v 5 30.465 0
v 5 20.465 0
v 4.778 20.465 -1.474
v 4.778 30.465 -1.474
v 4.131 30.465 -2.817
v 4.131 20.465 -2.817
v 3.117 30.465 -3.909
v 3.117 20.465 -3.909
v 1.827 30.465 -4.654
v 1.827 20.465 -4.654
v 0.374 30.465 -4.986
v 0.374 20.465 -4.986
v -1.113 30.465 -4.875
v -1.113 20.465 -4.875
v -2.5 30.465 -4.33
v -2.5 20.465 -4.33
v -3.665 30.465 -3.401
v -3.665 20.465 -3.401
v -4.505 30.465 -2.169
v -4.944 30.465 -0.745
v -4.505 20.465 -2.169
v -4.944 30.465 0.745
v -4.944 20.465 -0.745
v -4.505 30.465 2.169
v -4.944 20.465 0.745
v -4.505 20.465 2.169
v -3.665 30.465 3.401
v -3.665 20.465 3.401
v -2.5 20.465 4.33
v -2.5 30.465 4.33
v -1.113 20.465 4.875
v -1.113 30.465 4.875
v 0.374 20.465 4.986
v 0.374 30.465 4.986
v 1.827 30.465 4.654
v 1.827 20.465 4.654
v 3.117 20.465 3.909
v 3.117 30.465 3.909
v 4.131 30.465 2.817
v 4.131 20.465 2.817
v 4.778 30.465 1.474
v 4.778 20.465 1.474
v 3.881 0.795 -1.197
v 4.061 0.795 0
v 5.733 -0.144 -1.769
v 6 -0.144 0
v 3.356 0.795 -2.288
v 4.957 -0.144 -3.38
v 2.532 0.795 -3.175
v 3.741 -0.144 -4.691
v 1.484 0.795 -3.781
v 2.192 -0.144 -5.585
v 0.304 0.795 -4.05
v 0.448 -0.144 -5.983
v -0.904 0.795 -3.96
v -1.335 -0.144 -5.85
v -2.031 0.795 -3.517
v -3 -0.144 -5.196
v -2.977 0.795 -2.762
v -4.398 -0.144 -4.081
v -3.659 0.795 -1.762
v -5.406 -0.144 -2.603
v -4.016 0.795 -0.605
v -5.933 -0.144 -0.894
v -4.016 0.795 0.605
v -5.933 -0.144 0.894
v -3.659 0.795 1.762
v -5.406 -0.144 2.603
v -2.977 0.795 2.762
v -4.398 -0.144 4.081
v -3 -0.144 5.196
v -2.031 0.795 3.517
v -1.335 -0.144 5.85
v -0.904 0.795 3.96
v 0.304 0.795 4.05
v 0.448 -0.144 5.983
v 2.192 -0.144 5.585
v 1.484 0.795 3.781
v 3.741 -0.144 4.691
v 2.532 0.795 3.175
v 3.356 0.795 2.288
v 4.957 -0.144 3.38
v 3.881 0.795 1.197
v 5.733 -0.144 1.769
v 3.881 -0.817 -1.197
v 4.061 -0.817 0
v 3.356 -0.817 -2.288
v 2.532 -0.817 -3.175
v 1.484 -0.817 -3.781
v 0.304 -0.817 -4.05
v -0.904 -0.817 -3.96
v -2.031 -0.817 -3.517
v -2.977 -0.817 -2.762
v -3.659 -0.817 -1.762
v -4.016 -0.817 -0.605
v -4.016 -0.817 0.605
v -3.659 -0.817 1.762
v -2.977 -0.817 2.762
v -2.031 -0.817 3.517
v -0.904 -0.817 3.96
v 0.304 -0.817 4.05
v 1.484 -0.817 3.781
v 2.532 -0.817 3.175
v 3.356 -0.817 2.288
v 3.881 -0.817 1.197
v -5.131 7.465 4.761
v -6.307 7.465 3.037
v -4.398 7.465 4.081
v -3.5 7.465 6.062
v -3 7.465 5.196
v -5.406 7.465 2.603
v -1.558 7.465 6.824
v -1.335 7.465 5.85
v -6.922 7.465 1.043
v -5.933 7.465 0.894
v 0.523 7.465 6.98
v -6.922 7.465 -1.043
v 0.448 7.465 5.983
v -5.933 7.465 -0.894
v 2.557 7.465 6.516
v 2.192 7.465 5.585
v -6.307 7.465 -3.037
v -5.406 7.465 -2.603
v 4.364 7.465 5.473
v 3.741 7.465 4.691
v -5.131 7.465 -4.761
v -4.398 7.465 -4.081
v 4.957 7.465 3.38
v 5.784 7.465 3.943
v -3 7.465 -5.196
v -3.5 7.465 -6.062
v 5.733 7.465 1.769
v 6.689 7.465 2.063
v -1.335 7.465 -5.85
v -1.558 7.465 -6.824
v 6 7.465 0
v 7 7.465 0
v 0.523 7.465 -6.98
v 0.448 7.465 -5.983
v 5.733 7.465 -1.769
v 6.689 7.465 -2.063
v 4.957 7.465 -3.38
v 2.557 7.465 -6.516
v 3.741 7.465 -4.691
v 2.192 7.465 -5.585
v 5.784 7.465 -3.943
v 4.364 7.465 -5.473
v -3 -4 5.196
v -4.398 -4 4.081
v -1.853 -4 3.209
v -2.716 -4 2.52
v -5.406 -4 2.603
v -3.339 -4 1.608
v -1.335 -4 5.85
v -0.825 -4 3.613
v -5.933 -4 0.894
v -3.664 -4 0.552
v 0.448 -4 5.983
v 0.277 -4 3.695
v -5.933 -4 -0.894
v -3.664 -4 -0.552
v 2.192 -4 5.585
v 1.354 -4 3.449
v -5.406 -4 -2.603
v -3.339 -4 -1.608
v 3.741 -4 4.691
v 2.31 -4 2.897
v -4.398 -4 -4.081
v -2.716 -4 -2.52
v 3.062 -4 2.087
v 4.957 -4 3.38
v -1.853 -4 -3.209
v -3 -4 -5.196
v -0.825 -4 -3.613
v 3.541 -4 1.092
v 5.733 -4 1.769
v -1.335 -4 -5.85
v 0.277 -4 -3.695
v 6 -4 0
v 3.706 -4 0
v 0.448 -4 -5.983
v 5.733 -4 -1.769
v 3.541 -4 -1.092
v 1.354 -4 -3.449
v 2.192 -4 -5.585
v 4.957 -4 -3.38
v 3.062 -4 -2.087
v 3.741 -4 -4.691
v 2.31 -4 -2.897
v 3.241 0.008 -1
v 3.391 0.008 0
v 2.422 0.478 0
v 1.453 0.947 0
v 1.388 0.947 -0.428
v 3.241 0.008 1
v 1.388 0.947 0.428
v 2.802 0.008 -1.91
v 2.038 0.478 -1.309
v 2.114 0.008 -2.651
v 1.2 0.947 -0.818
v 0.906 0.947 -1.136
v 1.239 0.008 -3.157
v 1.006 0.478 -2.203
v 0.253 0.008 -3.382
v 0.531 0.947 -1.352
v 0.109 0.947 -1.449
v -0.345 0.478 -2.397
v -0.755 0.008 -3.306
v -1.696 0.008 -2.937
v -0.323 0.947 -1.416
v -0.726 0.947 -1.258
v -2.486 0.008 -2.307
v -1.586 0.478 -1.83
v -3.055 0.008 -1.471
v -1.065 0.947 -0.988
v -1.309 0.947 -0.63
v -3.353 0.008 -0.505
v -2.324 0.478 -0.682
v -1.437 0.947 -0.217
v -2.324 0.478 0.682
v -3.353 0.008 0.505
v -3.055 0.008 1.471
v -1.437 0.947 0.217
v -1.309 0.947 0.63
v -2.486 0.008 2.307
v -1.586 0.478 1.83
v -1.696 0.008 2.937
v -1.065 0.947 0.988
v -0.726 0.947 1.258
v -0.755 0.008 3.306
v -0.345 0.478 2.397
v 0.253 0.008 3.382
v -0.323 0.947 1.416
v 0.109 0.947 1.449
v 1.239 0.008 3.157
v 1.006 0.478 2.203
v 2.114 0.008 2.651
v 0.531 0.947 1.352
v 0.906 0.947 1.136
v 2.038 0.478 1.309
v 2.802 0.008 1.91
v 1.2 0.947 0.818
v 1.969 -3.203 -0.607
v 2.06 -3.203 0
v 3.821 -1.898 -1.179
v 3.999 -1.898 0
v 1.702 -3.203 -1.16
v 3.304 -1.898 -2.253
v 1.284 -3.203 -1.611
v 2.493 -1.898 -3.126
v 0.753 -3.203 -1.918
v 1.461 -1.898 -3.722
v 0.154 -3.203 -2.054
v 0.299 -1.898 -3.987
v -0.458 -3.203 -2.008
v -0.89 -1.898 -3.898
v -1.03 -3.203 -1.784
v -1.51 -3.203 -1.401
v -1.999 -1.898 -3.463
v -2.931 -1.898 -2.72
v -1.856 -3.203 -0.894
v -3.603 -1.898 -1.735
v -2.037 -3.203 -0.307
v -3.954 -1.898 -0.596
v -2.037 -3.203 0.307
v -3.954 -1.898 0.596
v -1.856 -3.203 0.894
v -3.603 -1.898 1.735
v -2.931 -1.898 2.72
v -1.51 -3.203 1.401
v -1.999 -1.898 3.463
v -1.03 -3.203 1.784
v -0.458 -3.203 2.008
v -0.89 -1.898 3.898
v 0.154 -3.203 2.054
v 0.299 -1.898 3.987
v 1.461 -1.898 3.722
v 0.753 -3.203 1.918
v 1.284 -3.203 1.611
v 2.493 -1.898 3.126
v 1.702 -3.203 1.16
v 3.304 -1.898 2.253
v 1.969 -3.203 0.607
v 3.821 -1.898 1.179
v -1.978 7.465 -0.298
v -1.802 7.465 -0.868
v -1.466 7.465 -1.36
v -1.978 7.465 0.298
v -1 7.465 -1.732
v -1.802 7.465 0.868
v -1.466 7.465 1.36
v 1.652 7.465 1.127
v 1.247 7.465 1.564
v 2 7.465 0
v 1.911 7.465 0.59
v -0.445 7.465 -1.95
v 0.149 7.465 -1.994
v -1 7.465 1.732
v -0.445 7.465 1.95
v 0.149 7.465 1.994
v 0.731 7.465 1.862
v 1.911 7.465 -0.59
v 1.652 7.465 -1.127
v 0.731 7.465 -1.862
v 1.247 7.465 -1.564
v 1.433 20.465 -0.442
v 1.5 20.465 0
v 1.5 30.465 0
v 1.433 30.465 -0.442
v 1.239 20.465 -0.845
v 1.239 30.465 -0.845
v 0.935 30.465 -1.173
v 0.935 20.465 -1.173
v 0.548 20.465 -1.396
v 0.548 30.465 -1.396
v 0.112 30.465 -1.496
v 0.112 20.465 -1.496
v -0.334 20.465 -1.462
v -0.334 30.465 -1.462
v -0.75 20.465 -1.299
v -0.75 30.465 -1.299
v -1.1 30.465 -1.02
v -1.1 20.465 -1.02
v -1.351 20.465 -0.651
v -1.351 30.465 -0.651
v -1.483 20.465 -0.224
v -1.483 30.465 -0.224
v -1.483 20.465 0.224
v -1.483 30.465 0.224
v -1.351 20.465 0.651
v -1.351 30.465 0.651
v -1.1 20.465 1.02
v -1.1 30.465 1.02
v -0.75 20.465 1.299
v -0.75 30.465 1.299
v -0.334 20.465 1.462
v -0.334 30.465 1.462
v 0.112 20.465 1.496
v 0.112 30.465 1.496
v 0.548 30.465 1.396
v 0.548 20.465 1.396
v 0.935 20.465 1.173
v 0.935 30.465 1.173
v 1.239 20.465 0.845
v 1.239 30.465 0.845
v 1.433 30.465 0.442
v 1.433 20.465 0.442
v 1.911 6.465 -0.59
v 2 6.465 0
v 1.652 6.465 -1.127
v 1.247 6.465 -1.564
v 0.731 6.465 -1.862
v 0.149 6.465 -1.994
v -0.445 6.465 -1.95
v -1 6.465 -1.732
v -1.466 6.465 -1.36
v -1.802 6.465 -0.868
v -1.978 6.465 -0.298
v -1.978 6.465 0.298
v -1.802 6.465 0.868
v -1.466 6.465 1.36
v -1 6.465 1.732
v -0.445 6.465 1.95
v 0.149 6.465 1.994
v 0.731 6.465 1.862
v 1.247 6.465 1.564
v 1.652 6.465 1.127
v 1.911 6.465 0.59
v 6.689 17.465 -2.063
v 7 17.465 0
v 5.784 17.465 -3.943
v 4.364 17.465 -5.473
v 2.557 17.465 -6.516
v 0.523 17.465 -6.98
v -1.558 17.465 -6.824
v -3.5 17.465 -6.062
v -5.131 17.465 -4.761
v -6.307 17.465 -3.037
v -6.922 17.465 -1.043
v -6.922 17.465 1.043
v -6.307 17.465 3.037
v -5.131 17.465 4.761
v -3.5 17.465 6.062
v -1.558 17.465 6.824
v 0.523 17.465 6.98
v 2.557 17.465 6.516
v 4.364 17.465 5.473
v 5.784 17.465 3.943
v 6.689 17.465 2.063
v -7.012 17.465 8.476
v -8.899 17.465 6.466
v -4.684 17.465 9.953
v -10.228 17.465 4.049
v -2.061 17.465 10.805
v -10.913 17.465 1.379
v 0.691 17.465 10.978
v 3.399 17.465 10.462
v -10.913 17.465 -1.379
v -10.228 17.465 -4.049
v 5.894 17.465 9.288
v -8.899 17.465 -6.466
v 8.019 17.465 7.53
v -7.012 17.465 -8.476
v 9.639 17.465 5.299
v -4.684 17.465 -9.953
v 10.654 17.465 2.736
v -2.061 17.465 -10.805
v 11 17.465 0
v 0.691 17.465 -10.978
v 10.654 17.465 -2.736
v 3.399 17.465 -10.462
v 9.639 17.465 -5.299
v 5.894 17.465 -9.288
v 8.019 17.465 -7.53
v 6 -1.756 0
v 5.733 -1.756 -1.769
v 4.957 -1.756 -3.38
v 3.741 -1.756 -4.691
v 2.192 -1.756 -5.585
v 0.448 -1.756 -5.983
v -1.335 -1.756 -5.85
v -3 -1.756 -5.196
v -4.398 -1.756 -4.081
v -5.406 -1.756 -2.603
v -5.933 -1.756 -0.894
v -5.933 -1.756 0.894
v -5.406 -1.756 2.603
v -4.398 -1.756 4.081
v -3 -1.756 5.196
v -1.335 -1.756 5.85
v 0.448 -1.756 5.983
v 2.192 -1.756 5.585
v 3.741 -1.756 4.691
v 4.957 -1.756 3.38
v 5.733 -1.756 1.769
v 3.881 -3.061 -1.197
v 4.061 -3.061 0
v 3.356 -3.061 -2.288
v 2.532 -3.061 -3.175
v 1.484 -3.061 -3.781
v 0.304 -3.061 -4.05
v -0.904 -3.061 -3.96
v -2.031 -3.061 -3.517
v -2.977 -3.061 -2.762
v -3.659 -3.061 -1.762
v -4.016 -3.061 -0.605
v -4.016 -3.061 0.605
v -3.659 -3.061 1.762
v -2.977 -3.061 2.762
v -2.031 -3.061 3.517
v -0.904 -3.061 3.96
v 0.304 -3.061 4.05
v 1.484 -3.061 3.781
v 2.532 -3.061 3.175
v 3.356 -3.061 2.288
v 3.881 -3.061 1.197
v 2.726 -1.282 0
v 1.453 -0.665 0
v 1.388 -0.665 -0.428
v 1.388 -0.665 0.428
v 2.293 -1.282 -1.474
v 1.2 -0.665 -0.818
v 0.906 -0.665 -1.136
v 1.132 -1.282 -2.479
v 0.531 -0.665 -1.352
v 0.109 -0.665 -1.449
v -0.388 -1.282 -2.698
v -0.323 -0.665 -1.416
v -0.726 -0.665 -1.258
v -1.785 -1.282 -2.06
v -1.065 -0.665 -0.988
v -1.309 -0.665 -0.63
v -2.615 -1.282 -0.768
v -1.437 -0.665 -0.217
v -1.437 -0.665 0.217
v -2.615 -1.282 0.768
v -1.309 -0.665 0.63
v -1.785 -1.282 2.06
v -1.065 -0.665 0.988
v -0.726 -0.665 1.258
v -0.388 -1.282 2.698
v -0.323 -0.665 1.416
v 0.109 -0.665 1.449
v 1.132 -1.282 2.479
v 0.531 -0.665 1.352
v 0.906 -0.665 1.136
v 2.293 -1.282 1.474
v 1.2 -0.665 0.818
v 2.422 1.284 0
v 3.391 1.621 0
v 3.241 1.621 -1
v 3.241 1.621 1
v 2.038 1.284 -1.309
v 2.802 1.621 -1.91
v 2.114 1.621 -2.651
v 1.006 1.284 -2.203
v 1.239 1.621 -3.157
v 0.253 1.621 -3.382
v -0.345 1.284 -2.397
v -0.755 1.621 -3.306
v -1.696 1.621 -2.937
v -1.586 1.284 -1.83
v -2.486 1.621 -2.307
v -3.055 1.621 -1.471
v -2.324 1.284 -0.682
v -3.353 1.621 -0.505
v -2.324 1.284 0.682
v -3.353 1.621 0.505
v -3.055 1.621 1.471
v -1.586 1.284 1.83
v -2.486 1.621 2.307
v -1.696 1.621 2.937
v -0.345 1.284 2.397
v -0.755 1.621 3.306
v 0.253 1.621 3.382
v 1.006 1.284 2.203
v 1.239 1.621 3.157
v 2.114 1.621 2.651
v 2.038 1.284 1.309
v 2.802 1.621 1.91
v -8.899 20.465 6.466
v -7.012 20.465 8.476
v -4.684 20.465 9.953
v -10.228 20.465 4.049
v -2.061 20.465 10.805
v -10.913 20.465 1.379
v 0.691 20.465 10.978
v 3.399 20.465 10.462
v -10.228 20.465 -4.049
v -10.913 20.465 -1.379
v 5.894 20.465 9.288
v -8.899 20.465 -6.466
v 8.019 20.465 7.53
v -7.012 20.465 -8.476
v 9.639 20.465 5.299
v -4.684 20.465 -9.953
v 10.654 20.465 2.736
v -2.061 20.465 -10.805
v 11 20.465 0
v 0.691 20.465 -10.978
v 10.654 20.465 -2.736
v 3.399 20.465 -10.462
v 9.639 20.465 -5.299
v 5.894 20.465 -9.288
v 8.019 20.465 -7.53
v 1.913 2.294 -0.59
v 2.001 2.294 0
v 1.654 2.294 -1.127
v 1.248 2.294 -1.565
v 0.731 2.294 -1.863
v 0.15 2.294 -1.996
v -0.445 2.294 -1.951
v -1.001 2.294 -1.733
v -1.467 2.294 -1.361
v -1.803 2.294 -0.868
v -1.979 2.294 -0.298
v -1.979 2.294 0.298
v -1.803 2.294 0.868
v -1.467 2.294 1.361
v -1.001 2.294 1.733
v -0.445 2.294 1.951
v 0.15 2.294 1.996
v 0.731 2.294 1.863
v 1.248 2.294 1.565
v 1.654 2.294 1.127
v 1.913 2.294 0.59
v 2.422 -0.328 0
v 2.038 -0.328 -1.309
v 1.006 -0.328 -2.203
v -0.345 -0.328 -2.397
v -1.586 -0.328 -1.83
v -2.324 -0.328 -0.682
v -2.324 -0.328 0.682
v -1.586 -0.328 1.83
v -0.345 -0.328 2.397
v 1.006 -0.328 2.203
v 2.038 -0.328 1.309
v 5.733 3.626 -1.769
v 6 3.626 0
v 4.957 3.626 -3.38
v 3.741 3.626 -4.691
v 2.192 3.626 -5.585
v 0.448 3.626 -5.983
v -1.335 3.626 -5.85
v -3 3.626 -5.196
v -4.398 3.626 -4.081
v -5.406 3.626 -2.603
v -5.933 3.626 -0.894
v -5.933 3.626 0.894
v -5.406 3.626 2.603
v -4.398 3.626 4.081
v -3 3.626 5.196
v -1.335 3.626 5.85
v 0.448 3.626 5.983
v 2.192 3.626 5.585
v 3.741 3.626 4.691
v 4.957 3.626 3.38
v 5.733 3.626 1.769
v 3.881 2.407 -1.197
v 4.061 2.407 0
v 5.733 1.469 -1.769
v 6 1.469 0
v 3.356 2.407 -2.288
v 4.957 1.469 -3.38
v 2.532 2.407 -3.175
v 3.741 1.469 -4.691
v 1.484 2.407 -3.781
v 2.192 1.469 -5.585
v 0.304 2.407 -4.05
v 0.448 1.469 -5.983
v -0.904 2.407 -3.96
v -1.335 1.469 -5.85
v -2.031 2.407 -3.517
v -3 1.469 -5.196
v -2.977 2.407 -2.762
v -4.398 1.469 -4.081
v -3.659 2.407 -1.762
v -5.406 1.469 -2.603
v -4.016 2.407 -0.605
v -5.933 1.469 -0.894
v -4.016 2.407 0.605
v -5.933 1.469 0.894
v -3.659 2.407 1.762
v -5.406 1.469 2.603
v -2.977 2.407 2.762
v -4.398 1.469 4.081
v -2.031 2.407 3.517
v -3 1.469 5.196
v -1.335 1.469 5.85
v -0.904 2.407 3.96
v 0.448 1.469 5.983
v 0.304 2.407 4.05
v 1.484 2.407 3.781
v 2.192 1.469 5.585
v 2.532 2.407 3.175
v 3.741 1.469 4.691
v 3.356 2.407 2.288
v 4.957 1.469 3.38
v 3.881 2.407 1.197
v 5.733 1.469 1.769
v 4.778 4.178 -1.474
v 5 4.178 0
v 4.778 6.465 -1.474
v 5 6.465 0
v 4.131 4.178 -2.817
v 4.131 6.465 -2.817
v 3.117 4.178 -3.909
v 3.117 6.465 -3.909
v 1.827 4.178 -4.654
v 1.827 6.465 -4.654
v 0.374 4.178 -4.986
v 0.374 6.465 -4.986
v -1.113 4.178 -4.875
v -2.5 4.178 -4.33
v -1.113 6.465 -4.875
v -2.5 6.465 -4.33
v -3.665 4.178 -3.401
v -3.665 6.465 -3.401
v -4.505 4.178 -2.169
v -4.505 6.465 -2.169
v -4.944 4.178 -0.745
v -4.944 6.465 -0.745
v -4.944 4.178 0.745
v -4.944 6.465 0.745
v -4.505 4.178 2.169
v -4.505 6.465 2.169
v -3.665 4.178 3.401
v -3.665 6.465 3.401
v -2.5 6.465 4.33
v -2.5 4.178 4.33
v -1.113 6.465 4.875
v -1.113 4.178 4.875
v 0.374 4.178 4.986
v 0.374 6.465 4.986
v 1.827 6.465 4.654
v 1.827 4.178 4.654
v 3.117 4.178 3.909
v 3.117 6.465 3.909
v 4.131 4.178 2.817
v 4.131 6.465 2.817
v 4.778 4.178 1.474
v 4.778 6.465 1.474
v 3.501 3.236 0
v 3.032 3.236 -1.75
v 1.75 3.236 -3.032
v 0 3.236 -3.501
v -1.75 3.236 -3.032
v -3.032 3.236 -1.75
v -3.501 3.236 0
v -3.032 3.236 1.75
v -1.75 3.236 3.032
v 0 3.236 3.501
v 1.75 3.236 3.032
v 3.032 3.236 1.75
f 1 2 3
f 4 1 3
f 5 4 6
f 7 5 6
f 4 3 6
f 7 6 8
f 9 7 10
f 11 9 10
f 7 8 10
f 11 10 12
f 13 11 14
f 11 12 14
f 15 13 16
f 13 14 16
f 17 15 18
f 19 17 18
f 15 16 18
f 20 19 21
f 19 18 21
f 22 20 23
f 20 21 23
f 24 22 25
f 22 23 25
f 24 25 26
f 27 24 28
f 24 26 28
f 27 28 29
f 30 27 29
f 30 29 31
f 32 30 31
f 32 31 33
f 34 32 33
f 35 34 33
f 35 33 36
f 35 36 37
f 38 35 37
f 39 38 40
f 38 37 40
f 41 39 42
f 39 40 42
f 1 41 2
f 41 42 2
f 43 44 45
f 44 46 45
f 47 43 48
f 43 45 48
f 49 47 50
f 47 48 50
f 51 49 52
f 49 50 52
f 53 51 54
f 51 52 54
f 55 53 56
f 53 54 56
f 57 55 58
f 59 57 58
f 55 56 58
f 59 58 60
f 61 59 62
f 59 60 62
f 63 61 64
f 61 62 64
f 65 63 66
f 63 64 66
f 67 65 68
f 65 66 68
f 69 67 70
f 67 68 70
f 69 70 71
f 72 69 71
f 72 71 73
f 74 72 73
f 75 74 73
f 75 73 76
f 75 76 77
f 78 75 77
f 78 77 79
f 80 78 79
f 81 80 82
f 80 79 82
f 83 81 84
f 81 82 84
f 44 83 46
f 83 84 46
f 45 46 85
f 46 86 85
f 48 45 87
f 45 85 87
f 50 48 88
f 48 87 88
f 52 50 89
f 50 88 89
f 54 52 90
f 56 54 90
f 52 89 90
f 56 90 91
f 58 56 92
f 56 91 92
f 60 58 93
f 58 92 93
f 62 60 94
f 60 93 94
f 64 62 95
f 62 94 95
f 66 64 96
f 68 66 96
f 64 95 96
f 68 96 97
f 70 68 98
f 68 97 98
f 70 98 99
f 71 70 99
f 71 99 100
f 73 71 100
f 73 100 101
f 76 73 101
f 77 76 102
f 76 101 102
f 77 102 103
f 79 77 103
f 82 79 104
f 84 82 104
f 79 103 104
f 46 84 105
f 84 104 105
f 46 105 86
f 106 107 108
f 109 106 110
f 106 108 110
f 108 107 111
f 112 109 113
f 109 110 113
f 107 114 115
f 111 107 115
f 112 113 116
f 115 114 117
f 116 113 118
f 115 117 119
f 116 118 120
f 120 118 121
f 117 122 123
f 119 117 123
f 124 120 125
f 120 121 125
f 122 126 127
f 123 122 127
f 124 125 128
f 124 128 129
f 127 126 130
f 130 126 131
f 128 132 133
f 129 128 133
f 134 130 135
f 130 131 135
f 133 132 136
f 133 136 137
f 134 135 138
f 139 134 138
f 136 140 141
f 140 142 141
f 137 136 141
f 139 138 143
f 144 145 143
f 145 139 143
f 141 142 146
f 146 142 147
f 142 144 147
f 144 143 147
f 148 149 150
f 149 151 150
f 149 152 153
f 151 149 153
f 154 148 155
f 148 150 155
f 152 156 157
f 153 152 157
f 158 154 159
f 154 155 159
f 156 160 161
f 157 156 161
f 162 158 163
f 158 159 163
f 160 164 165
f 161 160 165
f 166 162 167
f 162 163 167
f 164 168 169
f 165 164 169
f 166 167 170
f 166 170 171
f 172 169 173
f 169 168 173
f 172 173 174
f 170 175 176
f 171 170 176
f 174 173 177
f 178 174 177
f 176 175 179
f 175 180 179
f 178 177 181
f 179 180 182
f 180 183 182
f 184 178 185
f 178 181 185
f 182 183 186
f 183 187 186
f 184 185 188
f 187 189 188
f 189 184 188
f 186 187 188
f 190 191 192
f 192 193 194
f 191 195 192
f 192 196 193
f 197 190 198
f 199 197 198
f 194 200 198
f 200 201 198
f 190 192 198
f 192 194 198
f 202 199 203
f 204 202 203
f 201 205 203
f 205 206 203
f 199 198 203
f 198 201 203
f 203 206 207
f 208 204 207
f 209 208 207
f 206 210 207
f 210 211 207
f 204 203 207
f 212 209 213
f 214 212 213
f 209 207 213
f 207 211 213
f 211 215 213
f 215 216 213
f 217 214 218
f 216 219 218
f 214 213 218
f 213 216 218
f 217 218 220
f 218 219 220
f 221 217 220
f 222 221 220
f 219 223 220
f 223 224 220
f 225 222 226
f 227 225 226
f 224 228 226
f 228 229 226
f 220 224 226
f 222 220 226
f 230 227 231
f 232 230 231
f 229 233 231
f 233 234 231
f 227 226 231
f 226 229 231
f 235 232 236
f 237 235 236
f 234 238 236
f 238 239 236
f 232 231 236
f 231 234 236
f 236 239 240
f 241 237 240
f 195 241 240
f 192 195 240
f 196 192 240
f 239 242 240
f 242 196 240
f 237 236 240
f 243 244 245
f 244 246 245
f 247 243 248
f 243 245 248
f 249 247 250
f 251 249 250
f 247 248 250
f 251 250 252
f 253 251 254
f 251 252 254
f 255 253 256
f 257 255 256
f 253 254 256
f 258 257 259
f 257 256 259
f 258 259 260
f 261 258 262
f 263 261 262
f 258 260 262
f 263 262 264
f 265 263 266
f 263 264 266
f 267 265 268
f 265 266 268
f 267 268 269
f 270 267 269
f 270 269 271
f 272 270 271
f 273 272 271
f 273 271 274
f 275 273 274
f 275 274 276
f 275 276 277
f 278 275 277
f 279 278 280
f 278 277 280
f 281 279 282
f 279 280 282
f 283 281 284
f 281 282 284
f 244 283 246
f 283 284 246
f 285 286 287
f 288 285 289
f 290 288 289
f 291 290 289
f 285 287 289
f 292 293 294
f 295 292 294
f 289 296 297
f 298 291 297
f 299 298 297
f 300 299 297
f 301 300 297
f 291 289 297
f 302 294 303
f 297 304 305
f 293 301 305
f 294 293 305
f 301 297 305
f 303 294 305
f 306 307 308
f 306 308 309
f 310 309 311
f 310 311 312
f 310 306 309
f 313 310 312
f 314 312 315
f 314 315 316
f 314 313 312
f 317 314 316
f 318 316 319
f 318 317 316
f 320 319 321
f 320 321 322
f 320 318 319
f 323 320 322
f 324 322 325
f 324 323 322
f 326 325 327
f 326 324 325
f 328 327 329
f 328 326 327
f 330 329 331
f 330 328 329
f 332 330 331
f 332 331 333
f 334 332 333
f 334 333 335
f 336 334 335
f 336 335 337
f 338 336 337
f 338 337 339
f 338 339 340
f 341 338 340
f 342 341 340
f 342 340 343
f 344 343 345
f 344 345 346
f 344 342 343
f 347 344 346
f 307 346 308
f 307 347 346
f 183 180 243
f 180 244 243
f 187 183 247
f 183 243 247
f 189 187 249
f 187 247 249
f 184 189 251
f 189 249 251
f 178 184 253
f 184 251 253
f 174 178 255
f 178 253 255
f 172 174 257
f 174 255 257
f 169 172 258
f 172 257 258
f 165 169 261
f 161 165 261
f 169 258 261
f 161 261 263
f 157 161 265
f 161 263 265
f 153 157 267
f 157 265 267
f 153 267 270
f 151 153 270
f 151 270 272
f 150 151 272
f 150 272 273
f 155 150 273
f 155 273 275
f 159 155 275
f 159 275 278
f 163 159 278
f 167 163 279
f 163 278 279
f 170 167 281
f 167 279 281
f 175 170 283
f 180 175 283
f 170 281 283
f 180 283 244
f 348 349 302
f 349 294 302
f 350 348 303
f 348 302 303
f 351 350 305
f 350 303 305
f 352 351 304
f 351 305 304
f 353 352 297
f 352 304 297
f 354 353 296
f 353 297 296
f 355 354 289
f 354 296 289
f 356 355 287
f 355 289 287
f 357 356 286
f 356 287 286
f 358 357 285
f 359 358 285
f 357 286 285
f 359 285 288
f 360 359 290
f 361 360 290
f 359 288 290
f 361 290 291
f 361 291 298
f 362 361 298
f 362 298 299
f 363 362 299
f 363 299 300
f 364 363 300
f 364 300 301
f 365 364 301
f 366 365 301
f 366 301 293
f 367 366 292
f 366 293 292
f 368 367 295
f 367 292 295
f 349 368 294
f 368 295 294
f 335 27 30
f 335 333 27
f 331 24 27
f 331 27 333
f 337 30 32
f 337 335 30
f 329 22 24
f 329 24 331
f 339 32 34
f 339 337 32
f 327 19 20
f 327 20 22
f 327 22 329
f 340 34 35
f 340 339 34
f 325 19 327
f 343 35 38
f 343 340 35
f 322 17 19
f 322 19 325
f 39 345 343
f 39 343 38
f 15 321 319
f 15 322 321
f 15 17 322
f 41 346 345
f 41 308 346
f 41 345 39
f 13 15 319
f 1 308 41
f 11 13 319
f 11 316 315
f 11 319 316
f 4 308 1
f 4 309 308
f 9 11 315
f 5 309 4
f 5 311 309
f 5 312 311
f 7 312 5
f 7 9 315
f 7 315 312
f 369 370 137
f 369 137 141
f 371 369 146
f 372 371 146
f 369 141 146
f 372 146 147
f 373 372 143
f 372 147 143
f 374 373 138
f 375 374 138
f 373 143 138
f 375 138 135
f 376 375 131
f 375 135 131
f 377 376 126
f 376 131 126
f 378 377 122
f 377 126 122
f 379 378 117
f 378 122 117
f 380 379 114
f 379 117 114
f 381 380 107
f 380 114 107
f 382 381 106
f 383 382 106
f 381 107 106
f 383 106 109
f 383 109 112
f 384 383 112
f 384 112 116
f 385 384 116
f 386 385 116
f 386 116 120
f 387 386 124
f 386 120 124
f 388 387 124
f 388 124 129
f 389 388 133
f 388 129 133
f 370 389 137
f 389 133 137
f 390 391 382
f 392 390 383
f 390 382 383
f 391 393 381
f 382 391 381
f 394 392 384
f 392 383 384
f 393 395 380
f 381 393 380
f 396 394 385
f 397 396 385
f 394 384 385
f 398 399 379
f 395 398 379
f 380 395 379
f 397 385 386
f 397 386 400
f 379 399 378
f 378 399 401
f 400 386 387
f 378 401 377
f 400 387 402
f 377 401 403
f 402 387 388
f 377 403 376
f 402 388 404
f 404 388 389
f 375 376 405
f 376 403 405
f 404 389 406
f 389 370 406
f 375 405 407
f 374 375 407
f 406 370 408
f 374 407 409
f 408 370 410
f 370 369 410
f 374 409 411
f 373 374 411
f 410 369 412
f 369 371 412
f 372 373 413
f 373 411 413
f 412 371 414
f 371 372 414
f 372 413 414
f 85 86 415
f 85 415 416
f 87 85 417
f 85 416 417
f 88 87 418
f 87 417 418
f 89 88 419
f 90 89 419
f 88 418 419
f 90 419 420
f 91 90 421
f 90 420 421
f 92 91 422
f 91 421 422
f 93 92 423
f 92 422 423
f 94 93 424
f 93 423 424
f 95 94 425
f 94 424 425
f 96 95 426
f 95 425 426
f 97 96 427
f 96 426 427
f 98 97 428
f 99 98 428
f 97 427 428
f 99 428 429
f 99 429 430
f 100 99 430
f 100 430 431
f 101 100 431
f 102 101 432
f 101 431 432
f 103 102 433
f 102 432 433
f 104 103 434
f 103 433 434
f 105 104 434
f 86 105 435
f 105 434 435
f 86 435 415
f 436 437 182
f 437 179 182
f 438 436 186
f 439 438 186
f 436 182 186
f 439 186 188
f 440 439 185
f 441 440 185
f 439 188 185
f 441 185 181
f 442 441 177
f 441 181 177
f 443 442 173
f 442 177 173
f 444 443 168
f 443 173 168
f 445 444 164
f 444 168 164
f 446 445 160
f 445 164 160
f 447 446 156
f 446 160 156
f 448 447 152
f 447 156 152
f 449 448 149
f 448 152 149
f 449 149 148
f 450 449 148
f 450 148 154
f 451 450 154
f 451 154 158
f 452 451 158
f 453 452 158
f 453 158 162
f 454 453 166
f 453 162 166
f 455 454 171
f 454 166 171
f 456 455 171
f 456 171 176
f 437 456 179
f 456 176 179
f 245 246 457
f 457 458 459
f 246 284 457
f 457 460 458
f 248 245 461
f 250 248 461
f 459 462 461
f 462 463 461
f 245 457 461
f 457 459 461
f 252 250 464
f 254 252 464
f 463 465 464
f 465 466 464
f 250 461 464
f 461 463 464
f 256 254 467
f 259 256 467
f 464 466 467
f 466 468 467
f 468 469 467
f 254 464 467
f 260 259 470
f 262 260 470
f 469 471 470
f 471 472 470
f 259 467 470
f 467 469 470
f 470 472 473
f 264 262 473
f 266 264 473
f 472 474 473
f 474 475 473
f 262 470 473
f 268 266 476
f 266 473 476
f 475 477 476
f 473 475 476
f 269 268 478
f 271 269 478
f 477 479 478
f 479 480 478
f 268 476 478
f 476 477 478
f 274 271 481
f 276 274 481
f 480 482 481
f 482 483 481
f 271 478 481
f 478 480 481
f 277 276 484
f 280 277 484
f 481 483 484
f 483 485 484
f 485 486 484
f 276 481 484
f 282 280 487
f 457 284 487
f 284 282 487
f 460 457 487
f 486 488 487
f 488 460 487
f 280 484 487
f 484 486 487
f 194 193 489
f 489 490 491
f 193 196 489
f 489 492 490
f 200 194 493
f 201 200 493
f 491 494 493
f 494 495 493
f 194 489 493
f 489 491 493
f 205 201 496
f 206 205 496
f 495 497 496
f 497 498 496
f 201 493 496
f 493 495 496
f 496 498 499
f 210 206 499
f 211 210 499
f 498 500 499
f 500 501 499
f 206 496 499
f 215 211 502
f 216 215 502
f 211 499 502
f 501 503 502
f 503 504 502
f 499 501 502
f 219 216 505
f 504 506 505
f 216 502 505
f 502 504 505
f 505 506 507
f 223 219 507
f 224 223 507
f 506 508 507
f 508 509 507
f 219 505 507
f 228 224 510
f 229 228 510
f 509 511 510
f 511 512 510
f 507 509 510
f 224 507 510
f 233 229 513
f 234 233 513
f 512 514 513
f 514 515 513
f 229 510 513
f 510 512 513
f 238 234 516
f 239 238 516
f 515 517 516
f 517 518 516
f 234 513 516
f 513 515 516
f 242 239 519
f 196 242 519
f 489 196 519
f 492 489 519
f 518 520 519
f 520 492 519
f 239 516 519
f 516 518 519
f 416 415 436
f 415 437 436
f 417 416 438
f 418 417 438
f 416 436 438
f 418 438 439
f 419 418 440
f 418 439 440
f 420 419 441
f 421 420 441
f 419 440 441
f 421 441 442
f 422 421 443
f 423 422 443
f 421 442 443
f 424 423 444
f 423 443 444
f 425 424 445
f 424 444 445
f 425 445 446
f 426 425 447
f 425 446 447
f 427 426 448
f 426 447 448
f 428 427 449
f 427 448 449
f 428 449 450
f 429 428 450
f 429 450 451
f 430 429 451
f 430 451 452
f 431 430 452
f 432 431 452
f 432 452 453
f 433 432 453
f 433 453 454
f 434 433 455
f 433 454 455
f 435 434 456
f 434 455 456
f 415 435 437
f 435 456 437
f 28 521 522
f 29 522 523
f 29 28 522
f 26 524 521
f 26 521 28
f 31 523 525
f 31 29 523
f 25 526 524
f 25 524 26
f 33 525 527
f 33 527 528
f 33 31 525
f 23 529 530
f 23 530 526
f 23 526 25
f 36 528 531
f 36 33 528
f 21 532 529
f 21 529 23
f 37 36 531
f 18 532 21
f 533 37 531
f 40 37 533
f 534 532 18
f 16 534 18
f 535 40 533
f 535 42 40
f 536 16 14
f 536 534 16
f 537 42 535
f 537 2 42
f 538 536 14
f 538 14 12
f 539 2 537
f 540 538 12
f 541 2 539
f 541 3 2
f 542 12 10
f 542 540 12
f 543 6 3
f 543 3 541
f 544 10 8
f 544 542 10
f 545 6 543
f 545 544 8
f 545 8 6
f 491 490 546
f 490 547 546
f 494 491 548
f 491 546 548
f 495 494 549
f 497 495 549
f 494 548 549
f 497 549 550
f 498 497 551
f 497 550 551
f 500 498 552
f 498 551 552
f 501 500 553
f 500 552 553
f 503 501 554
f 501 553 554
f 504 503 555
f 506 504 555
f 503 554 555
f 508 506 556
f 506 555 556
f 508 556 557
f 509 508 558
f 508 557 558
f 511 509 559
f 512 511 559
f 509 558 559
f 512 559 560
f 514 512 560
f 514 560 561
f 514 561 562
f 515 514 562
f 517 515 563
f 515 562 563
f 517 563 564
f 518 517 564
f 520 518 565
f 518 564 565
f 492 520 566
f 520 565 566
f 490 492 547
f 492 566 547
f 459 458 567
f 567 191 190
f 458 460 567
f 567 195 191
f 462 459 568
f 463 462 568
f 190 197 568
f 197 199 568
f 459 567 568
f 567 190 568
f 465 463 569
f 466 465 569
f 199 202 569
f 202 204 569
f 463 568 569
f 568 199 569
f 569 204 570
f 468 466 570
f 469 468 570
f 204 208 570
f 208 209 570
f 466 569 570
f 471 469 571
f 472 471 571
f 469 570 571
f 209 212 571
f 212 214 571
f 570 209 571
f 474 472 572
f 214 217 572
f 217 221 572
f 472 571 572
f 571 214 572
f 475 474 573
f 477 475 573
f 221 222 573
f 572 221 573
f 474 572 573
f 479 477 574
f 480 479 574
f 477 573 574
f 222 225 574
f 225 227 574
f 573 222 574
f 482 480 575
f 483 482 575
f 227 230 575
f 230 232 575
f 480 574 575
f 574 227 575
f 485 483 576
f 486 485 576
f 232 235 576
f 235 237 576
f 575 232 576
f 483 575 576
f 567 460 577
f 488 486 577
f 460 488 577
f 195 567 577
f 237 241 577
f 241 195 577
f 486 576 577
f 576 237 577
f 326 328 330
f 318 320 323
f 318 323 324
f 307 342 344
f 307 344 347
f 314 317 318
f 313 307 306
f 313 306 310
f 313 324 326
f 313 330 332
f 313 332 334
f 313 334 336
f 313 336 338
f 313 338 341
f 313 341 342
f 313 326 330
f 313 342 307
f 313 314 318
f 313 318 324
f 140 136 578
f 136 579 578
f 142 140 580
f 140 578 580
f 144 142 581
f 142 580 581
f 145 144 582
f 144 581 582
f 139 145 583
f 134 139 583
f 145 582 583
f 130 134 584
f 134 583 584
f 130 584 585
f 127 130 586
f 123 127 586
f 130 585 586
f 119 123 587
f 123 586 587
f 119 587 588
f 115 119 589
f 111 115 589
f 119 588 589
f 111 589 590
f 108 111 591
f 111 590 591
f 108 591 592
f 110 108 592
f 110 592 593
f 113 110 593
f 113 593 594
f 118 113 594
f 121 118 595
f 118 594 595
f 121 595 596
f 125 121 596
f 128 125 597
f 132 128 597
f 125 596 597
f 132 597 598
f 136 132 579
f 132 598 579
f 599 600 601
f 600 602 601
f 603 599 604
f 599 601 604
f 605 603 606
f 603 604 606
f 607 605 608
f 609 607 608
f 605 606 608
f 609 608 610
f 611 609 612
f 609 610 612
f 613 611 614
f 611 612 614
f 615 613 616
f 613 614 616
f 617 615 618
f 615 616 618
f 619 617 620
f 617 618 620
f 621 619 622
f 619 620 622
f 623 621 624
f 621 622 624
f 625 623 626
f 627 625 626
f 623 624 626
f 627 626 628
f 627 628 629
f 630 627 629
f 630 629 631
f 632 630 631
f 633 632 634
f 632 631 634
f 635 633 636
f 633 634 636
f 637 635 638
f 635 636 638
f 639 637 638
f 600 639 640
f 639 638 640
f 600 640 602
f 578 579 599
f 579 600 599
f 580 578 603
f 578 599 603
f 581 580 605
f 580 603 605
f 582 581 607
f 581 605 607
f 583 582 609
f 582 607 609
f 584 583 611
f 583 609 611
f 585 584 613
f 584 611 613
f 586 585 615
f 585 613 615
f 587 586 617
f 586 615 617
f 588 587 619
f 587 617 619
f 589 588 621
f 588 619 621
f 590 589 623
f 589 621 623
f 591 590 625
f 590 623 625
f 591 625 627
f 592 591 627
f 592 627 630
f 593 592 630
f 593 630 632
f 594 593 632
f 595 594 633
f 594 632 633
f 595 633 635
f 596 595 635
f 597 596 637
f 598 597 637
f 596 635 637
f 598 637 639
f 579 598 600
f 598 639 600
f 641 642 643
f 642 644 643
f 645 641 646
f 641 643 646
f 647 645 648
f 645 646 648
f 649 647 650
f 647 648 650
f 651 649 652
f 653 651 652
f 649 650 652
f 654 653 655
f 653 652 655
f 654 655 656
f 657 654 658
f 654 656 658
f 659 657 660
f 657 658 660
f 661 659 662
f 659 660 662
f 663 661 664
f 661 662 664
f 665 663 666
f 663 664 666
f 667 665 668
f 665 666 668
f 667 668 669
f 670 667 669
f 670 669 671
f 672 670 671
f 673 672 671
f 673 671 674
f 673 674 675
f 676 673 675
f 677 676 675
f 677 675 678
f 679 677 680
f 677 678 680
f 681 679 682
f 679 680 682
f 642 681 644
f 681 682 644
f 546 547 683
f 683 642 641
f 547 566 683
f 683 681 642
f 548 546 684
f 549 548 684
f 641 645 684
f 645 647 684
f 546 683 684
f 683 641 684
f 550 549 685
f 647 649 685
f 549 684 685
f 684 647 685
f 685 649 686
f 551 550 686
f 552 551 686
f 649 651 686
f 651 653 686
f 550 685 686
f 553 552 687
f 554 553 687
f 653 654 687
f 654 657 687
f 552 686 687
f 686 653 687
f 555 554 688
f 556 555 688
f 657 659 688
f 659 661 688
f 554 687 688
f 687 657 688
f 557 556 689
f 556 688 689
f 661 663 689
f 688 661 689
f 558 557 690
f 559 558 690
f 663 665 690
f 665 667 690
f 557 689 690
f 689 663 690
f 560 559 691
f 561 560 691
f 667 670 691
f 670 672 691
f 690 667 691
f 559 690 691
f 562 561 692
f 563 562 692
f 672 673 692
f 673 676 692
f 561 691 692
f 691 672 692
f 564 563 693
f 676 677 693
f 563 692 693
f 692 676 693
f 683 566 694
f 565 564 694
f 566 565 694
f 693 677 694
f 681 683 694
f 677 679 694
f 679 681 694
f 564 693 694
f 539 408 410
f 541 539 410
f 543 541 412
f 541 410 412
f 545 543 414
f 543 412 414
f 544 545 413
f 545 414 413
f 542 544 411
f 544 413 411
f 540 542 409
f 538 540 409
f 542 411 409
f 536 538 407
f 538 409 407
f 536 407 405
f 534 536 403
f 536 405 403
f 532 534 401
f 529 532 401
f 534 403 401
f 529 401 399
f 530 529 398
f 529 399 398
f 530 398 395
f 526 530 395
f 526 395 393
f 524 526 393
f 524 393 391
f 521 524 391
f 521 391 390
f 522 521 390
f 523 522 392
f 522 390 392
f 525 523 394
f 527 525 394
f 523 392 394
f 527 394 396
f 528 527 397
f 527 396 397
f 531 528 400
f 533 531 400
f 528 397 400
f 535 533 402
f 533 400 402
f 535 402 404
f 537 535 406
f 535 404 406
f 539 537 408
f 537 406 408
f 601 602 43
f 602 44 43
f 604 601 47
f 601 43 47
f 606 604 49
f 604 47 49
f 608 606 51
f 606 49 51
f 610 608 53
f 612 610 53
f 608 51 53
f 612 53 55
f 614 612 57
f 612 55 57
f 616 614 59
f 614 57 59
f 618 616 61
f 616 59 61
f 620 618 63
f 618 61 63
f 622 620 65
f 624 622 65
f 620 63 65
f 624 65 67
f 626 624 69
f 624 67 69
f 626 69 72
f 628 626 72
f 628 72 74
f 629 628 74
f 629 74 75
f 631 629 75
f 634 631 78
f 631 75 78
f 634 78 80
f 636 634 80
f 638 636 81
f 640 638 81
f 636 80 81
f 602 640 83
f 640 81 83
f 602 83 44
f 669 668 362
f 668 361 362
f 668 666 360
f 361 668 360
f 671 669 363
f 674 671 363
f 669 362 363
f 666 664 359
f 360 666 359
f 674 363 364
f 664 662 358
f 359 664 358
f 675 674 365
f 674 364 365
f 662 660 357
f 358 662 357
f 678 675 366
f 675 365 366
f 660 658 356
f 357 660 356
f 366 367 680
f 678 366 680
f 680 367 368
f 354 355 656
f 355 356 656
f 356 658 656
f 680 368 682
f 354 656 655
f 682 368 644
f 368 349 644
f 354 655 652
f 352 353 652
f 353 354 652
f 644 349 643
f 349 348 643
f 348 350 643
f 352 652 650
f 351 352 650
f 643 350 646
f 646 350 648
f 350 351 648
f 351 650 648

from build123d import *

# Parameters (mm, degrees)
SKETCH_2_R      = 7
EXTRUDE_1_DEPTH = 10
SKETCH_3_R      = 11
EXTRUDE_2_DEPTH = 3
SKETCH_4_R      = 5
SKETCH_4_R_2    = 1.5
EXTRUDE_3_DEPTH = 10


with BuildPart() as part:
    # 草图1 → 旋转1 (revolve)
    with BuildSketch(Plane(origin=(0, 0, 0), x_dir=(-1, 0, 0), z_dir=(0, 0, -1))):
        Polygon((-6, -4), (-3.705599294, -4), (-2.060062716, -3.203134621), (-3.998627726, -1.898006037), (-1.452745067, -0.665140249), (-3.391310077, 0.008460706), (-1.452745067, 0.947227648), (-3.391310077, 1.620828604), (-2.001444472, 2.293883094), (-5, 4.178313324), (-5, 6.465133326), (-2, 6.465133326), (-2, 7.465133326), (-6, 7.465133326), (-6, 3.625681691), (-4.06143499, 2.407398263), (-6, 1.468631321), (-4.06143499, 0.795030366), (-6, -0.143736577), (-4.06143499, -0.817337532), (-6, -1.756104474), (-4.06143499, -3.061233058), align=None)
    revolve(axis=Axis((0, -4, 0), (0, 1, 0)))

    # 草图2 → 凸台-拉伸1 (add)
    with BuildSketch(Plane(origin=(0, 7.465133326, 0), x_dir=(1, 0, 0), z_dir=(0, 1, 0))):
        Circle(SKETCH_2_R)
    extrude(amount=EXTRUDE_1_DEPTH)

    # 草图3 → 凸台-拉伸2 (add)
    with BuildSketch(Plane(origin=(0, 17.465133326, 0), x_dir=(1, 0, 0), z_dir=(0, 1, 0))):
        Circle(SKETCH_3_R)
    extrude(amount=EXTRUDE_2_DEPTH)

    # 草图4 → 凸台-拉伸3 (add)
    with BuildSketch(Plane(origin=(0, 20.465133326, 0), x_dir=(1, 0, 0), z_dir=(0, 1, 0))):
        Circle(SKETCH_4_R)
        Circle(SKETCH_4_R_2, mode=Mode.SUBTRACT)
    extrude(amount=EXTRUDE_3_DEPTH)


solid = part.part
